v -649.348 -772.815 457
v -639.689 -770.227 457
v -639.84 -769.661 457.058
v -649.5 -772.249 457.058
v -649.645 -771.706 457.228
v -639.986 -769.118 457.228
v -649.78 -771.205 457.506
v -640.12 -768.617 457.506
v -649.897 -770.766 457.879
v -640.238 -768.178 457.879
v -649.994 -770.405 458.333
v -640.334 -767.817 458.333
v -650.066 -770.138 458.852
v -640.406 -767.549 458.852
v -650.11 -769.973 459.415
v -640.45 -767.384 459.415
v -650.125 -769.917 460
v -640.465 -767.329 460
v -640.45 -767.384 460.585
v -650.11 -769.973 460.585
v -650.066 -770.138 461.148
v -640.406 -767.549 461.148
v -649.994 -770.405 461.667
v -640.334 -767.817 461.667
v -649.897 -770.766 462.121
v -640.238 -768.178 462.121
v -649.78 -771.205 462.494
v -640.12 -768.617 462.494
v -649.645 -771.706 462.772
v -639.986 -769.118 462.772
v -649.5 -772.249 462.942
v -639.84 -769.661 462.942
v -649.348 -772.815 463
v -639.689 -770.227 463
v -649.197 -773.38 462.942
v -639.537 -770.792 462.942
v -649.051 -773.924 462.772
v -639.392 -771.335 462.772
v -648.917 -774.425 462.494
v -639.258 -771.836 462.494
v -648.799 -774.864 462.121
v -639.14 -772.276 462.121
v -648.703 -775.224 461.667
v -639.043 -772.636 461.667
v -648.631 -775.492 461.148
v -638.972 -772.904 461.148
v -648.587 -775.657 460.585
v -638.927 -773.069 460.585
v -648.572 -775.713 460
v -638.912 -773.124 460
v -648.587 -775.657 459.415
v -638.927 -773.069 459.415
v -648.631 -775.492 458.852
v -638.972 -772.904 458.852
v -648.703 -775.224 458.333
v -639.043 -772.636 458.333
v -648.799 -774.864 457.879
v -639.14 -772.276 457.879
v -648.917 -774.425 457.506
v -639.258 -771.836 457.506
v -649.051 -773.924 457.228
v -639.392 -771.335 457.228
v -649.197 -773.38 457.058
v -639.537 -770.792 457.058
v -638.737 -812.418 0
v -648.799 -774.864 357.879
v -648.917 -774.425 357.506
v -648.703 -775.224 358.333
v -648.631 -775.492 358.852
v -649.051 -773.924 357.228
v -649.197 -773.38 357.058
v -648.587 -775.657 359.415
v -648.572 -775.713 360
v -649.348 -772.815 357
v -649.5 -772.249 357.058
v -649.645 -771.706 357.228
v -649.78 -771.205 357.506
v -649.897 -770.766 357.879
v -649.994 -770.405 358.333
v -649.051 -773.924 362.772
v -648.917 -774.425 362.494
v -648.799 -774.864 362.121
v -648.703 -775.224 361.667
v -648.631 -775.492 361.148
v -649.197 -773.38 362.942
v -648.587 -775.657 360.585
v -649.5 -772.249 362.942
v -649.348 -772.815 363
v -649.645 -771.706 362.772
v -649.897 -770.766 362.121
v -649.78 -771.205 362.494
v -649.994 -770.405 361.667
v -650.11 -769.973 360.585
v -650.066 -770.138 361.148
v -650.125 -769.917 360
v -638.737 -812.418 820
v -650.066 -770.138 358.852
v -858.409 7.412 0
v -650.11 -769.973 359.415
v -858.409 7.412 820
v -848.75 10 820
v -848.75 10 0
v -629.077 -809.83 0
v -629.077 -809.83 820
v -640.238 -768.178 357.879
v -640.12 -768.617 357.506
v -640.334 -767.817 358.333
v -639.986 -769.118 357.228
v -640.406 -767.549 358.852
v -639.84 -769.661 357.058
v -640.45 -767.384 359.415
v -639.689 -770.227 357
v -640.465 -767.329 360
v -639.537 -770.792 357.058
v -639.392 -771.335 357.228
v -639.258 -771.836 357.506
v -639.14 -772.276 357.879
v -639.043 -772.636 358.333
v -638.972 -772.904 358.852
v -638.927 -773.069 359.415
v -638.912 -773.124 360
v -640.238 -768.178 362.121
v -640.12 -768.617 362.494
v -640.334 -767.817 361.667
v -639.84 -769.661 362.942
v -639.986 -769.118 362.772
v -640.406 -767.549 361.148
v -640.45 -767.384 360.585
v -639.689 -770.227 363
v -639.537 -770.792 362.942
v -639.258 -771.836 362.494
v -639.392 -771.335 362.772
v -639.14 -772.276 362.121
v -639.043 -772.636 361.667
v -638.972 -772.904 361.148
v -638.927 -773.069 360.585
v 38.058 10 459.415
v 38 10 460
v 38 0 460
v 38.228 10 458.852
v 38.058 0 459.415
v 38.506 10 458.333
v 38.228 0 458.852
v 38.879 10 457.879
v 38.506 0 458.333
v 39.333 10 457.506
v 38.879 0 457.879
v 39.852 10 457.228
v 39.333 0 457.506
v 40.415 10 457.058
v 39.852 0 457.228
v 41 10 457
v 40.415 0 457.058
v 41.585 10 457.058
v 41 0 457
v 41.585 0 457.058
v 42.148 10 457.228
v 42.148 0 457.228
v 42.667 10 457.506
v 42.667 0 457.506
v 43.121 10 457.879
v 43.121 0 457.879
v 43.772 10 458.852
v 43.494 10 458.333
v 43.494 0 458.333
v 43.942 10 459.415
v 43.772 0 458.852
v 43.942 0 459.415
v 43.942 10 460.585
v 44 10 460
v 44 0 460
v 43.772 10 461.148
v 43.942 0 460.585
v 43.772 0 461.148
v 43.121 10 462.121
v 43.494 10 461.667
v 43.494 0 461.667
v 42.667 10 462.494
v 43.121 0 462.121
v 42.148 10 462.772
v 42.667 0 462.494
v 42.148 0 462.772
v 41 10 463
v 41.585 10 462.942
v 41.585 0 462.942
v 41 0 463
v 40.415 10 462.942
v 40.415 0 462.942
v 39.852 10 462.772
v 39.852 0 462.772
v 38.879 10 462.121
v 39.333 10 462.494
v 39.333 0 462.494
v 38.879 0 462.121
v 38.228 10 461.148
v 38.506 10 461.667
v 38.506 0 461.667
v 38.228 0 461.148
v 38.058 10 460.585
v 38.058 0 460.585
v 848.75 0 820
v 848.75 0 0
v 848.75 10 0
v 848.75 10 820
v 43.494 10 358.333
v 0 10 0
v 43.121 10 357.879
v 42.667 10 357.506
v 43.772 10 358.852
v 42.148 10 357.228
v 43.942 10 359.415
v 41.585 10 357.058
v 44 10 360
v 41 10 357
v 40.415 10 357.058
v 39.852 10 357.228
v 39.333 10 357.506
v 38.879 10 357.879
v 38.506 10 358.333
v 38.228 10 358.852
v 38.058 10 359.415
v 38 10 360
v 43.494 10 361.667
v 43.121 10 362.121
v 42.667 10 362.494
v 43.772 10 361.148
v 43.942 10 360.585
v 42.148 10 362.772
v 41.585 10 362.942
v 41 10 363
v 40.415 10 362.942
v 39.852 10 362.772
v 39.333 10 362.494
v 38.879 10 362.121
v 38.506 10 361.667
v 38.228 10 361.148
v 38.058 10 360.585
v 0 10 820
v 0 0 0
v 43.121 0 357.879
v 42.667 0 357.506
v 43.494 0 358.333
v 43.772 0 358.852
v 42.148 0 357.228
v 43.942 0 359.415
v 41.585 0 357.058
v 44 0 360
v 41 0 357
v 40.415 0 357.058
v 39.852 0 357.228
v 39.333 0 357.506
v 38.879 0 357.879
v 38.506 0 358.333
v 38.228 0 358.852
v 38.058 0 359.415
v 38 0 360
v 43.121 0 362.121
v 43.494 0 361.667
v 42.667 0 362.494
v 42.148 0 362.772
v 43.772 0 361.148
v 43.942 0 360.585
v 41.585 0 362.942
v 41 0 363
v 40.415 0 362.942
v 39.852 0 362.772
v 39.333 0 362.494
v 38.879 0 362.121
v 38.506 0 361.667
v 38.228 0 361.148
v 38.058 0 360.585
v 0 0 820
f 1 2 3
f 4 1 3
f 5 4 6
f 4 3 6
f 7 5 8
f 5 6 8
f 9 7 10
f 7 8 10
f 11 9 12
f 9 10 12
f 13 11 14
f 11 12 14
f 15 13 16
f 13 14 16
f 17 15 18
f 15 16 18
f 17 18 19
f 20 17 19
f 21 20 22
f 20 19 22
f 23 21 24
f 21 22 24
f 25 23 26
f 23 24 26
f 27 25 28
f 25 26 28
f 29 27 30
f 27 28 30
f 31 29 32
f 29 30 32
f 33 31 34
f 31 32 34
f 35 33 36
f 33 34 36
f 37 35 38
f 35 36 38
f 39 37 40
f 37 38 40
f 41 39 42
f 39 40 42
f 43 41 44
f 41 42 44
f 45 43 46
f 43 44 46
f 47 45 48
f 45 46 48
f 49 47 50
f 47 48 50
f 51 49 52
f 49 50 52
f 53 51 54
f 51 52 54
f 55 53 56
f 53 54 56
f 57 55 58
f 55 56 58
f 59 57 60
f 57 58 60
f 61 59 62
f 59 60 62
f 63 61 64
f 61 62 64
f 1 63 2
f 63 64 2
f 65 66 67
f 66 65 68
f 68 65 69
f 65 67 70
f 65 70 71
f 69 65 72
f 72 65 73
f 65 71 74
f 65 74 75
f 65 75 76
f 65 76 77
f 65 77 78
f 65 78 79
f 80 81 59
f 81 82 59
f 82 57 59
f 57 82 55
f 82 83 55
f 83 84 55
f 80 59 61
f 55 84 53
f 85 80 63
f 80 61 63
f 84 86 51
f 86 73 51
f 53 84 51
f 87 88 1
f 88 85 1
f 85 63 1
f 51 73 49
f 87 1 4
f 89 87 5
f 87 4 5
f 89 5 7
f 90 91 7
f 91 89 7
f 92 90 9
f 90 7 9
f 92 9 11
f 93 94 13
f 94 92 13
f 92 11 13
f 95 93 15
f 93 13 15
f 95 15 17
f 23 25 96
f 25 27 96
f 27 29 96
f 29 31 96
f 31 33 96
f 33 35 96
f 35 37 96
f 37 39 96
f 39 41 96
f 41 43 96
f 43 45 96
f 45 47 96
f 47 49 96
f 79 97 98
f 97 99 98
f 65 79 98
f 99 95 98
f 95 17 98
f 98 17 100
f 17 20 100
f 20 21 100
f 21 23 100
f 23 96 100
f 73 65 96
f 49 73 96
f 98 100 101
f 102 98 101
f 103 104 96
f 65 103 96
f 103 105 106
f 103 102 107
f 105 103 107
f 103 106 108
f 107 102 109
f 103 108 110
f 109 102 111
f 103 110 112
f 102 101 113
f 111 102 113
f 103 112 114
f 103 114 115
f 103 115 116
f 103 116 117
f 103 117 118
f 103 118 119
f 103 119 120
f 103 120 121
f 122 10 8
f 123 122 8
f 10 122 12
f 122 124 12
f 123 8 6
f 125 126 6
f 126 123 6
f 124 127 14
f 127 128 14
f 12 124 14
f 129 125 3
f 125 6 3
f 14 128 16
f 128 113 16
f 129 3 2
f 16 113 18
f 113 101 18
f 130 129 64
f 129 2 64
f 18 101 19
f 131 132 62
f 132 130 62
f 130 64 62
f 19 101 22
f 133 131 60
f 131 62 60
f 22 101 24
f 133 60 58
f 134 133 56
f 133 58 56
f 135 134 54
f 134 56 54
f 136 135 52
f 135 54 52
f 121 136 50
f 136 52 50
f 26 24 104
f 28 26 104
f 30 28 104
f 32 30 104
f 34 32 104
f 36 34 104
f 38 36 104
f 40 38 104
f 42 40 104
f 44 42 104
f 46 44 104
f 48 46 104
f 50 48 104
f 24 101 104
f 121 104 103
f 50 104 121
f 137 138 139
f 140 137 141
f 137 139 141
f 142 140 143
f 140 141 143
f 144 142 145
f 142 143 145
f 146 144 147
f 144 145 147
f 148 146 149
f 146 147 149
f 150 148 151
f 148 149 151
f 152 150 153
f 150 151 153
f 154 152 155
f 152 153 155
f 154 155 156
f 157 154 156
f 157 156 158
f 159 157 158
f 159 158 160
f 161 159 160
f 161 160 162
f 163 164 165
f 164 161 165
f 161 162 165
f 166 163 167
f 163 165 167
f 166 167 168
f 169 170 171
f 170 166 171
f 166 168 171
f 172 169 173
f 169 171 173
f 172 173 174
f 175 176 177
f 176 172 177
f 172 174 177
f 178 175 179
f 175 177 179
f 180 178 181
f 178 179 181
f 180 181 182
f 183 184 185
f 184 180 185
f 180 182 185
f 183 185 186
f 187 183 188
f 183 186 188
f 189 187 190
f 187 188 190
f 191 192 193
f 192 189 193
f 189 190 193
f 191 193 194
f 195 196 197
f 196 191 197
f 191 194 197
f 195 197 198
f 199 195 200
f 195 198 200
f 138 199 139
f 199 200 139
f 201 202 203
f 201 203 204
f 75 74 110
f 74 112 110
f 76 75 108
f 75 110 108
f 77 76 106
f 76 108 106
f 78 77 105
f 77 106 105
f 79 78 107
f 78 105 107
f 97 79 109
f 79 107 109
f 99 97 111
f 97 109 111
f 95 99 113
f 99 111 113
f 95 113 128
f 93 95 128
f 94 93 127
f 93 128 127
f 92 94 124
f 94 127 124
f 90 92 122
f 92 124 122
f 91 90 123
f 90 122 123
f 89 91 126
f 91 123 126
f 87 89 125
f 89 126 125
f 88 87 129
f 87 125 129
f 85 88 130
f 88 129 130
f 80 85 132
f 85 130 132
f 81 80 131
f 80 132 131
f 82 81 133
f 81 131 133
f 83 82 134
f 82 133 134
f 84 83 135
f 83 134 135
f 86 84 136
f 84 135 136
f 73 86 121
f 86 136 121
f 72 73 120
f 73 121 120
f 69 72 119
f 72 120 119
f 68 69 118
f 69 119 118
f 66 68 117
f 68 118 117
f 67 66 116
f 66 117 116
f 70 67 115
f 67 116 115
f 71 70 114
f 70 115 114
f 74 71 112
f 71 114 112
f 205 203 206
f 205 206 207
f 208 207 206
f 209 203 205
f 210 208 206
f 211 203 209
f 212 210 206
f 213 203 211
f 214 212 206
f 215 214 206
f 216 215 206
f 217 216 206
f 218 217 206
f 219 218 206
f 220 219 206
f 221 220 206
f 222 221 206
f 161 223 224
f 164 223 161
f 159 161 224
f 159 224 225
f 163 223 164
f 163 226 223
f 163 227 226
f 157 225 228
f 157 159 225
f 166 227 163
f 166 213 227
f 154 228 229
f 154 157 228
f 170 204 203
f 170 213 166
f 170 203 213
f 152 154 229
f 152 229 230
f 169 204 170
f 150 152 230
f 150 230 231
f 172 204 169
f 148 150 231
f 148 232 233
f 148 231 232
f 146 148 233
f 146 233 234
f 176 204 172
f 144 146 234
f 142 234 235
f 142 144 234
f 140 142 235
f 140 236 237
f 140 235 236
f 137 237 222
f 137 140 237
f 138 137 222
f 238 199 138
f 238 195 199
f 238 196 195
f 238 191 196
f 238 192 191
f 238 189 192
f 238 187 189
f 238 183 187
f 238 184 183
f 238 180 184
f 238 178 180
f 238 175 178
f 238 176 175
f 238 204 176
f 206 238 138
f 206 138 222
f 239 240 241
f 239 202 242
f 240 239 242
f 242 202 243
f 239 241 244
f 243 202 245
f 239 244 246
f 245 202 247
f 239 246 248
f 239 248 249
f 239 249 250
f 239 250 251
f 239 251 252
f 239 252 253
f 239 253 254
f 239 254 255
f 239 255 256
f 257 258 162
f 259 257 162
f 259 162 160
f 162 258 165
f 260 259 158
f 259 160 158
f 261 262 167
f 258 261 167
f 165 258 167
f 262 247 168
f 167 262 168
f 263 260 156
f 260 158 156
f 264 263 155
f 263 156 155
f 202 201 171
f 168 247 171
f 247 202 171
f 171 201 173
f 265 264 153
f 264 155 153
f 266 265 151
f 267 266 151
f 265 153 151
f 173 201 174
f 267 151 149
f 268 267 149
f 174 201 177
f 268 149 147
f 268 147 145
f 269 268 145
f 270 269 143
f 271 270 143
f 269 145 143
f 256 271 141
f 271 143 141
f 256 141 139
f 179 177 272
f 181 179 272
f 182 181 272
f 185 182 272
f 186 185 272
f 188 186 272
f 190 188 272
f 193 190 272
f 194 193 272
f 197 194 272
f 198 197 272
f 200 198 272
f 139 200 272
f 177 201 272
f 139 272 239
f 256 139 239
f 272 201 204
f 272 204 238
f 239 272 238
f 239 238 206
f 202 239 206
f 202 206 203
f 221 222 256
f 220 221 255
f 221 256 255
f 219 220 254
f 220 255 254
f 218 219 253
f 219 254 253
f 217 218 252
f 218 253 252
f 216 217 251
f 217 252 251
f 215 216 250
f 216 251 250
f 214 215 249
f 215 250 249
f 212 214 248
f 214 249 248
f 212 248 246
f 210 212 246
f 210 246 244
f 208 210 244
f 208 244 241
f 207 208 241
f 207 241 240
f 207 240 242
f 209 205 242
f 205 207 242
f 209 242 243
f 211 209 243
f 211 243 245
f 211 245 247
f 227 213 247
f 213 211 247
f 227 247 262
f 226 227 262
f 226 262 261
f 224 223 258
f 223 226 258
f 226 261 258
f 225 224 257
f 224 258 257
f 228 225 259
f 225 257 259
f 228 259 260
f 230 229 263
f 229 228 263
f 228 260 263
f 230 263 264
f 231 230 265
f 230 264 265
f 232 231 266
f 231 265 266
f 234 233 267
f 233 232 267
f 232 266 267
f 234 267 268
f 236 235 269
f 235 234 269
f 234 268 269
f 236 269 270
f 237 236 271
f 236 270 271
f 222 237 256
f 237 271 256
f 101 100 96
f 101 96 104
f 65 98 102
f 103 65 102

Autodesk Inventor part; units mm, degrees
ref_plane "YZ Plane" through (0, 0, 0) normal (1, 0, 0) x (0, 1, 0)
ref_plane "XZ Plane" through (0, 0, 0) normal (0, 1, 0) x (-1, 0, 0)
ref_plane "XY Plane" through (0, 0, 0) normal (0, 0, 1) x (1, 0, 0)
sketch "Sketch1" plane through (0, 0, 0) normal (0, 1, 0) x (-1, 0, 0)
  line L0 (0, 0) -> (-848.75, 0)
  line L1 (-848.75, 0) -> (-848.75, 820)
  line L2 (-848.75, 820) -> (0, 820)
  line L3 (0, 820) -> (0, 0)
  line L4 (0, 410) -> (-41, 410)
  line L5 (-41, 410) -> (-41, 460)
  line L6 (-41, 460) -> (-41, 360)
  circle A0 centre (-41, 460) radius 3
  circle A1 centre (-41, 360) radius 3
  dimension "ancho_m" = 848.75
  dimension "h_inf" = 820
  dimension "d2" = 41
  dimension "d3" = 50
  dimension "d4" = 100
  dimension "d5" = 6
  dimension "d6" = 6
extrude "Extrusion1" add sketch "Sketch1" along normal blind 10
sketch "Boceto10" plane through (0, 0, 820) normal (0, 0, 1) x (1, 0, 0)
  line L0 (848.75, 10) -> (0, 10) projected
  line L1 (0, 10) -> (-848.75, 10)
  line L2 (-848.75, 10) -> (-629.0773, -809.8295)
  line L3 (-848.75, 10) -> (0, 10) construction
  line L4 (-629.0773, -809.8295) -> (-638.7366, -812.4177)
  line L5 (-638.7366, -812.4177) -> (-858.4093, 7.4118)
  line L6 (-858.4093, 7.4118) -> (-848.75, 10)
  point P0 (0, 0)
  dimension "d49" = 848.75
  dimension "d50" = 848.75
  dimension "angulo" = 75
  dimension "d52" = 10
  dimension "d53" = 848.75
extrude "Extrusión10" add sketch "Boceto10" against normal blind 820
sketch "Boceto11" plane through (-629.0773, -809.8295, 820) normal (0.9659258, 0.258819, 0) x (0, 0, -1)
  line L0 (0, 848.75) -> (0, 0) projected
  line L1 (0, 0) -> (820, 0) projected
  line L2 (820, 848.75) -> (820, 0) projected
  line L3 (0, 848.75) -> (820, 848.75) projected
  line L4 (0, 0) -> (820, 0) projected
  line L5 (410, 0) -> (410, 41)
  line L6 (410, 41) -> (360, 41)
  line L7 (360, 41) -> (460, 41)
  circle A0 centre (360, 41) radius 3
  circle A1 centre (460, 41) radius 3
  point P0 (820, 619.4181)
  dimension "d56" = 41
  dimension "d57" = 50
  dimension "d58" = 100
  dimension "d59" = 6
  dimension "d60" = 6
extrude "Extrusión11" cut sketch "Boceto11" against normal up to next contours A0 | A1
equation "\"d2\" = 0.05 * h_inf"
equation "\"d49\" = ancho_m"
equation "\"d50\" = ancho_m"
equation "\"d52\" = espesor"
equation "\"d53\" = ancho_m"
equation "\"d54\" = h_inf"
equation "\"d56\" = 0.05 * h_inf"
equation "\"d61\" = h_inf"
equation "\"espesor\" = 10"
properties part number "puerta_inf"
